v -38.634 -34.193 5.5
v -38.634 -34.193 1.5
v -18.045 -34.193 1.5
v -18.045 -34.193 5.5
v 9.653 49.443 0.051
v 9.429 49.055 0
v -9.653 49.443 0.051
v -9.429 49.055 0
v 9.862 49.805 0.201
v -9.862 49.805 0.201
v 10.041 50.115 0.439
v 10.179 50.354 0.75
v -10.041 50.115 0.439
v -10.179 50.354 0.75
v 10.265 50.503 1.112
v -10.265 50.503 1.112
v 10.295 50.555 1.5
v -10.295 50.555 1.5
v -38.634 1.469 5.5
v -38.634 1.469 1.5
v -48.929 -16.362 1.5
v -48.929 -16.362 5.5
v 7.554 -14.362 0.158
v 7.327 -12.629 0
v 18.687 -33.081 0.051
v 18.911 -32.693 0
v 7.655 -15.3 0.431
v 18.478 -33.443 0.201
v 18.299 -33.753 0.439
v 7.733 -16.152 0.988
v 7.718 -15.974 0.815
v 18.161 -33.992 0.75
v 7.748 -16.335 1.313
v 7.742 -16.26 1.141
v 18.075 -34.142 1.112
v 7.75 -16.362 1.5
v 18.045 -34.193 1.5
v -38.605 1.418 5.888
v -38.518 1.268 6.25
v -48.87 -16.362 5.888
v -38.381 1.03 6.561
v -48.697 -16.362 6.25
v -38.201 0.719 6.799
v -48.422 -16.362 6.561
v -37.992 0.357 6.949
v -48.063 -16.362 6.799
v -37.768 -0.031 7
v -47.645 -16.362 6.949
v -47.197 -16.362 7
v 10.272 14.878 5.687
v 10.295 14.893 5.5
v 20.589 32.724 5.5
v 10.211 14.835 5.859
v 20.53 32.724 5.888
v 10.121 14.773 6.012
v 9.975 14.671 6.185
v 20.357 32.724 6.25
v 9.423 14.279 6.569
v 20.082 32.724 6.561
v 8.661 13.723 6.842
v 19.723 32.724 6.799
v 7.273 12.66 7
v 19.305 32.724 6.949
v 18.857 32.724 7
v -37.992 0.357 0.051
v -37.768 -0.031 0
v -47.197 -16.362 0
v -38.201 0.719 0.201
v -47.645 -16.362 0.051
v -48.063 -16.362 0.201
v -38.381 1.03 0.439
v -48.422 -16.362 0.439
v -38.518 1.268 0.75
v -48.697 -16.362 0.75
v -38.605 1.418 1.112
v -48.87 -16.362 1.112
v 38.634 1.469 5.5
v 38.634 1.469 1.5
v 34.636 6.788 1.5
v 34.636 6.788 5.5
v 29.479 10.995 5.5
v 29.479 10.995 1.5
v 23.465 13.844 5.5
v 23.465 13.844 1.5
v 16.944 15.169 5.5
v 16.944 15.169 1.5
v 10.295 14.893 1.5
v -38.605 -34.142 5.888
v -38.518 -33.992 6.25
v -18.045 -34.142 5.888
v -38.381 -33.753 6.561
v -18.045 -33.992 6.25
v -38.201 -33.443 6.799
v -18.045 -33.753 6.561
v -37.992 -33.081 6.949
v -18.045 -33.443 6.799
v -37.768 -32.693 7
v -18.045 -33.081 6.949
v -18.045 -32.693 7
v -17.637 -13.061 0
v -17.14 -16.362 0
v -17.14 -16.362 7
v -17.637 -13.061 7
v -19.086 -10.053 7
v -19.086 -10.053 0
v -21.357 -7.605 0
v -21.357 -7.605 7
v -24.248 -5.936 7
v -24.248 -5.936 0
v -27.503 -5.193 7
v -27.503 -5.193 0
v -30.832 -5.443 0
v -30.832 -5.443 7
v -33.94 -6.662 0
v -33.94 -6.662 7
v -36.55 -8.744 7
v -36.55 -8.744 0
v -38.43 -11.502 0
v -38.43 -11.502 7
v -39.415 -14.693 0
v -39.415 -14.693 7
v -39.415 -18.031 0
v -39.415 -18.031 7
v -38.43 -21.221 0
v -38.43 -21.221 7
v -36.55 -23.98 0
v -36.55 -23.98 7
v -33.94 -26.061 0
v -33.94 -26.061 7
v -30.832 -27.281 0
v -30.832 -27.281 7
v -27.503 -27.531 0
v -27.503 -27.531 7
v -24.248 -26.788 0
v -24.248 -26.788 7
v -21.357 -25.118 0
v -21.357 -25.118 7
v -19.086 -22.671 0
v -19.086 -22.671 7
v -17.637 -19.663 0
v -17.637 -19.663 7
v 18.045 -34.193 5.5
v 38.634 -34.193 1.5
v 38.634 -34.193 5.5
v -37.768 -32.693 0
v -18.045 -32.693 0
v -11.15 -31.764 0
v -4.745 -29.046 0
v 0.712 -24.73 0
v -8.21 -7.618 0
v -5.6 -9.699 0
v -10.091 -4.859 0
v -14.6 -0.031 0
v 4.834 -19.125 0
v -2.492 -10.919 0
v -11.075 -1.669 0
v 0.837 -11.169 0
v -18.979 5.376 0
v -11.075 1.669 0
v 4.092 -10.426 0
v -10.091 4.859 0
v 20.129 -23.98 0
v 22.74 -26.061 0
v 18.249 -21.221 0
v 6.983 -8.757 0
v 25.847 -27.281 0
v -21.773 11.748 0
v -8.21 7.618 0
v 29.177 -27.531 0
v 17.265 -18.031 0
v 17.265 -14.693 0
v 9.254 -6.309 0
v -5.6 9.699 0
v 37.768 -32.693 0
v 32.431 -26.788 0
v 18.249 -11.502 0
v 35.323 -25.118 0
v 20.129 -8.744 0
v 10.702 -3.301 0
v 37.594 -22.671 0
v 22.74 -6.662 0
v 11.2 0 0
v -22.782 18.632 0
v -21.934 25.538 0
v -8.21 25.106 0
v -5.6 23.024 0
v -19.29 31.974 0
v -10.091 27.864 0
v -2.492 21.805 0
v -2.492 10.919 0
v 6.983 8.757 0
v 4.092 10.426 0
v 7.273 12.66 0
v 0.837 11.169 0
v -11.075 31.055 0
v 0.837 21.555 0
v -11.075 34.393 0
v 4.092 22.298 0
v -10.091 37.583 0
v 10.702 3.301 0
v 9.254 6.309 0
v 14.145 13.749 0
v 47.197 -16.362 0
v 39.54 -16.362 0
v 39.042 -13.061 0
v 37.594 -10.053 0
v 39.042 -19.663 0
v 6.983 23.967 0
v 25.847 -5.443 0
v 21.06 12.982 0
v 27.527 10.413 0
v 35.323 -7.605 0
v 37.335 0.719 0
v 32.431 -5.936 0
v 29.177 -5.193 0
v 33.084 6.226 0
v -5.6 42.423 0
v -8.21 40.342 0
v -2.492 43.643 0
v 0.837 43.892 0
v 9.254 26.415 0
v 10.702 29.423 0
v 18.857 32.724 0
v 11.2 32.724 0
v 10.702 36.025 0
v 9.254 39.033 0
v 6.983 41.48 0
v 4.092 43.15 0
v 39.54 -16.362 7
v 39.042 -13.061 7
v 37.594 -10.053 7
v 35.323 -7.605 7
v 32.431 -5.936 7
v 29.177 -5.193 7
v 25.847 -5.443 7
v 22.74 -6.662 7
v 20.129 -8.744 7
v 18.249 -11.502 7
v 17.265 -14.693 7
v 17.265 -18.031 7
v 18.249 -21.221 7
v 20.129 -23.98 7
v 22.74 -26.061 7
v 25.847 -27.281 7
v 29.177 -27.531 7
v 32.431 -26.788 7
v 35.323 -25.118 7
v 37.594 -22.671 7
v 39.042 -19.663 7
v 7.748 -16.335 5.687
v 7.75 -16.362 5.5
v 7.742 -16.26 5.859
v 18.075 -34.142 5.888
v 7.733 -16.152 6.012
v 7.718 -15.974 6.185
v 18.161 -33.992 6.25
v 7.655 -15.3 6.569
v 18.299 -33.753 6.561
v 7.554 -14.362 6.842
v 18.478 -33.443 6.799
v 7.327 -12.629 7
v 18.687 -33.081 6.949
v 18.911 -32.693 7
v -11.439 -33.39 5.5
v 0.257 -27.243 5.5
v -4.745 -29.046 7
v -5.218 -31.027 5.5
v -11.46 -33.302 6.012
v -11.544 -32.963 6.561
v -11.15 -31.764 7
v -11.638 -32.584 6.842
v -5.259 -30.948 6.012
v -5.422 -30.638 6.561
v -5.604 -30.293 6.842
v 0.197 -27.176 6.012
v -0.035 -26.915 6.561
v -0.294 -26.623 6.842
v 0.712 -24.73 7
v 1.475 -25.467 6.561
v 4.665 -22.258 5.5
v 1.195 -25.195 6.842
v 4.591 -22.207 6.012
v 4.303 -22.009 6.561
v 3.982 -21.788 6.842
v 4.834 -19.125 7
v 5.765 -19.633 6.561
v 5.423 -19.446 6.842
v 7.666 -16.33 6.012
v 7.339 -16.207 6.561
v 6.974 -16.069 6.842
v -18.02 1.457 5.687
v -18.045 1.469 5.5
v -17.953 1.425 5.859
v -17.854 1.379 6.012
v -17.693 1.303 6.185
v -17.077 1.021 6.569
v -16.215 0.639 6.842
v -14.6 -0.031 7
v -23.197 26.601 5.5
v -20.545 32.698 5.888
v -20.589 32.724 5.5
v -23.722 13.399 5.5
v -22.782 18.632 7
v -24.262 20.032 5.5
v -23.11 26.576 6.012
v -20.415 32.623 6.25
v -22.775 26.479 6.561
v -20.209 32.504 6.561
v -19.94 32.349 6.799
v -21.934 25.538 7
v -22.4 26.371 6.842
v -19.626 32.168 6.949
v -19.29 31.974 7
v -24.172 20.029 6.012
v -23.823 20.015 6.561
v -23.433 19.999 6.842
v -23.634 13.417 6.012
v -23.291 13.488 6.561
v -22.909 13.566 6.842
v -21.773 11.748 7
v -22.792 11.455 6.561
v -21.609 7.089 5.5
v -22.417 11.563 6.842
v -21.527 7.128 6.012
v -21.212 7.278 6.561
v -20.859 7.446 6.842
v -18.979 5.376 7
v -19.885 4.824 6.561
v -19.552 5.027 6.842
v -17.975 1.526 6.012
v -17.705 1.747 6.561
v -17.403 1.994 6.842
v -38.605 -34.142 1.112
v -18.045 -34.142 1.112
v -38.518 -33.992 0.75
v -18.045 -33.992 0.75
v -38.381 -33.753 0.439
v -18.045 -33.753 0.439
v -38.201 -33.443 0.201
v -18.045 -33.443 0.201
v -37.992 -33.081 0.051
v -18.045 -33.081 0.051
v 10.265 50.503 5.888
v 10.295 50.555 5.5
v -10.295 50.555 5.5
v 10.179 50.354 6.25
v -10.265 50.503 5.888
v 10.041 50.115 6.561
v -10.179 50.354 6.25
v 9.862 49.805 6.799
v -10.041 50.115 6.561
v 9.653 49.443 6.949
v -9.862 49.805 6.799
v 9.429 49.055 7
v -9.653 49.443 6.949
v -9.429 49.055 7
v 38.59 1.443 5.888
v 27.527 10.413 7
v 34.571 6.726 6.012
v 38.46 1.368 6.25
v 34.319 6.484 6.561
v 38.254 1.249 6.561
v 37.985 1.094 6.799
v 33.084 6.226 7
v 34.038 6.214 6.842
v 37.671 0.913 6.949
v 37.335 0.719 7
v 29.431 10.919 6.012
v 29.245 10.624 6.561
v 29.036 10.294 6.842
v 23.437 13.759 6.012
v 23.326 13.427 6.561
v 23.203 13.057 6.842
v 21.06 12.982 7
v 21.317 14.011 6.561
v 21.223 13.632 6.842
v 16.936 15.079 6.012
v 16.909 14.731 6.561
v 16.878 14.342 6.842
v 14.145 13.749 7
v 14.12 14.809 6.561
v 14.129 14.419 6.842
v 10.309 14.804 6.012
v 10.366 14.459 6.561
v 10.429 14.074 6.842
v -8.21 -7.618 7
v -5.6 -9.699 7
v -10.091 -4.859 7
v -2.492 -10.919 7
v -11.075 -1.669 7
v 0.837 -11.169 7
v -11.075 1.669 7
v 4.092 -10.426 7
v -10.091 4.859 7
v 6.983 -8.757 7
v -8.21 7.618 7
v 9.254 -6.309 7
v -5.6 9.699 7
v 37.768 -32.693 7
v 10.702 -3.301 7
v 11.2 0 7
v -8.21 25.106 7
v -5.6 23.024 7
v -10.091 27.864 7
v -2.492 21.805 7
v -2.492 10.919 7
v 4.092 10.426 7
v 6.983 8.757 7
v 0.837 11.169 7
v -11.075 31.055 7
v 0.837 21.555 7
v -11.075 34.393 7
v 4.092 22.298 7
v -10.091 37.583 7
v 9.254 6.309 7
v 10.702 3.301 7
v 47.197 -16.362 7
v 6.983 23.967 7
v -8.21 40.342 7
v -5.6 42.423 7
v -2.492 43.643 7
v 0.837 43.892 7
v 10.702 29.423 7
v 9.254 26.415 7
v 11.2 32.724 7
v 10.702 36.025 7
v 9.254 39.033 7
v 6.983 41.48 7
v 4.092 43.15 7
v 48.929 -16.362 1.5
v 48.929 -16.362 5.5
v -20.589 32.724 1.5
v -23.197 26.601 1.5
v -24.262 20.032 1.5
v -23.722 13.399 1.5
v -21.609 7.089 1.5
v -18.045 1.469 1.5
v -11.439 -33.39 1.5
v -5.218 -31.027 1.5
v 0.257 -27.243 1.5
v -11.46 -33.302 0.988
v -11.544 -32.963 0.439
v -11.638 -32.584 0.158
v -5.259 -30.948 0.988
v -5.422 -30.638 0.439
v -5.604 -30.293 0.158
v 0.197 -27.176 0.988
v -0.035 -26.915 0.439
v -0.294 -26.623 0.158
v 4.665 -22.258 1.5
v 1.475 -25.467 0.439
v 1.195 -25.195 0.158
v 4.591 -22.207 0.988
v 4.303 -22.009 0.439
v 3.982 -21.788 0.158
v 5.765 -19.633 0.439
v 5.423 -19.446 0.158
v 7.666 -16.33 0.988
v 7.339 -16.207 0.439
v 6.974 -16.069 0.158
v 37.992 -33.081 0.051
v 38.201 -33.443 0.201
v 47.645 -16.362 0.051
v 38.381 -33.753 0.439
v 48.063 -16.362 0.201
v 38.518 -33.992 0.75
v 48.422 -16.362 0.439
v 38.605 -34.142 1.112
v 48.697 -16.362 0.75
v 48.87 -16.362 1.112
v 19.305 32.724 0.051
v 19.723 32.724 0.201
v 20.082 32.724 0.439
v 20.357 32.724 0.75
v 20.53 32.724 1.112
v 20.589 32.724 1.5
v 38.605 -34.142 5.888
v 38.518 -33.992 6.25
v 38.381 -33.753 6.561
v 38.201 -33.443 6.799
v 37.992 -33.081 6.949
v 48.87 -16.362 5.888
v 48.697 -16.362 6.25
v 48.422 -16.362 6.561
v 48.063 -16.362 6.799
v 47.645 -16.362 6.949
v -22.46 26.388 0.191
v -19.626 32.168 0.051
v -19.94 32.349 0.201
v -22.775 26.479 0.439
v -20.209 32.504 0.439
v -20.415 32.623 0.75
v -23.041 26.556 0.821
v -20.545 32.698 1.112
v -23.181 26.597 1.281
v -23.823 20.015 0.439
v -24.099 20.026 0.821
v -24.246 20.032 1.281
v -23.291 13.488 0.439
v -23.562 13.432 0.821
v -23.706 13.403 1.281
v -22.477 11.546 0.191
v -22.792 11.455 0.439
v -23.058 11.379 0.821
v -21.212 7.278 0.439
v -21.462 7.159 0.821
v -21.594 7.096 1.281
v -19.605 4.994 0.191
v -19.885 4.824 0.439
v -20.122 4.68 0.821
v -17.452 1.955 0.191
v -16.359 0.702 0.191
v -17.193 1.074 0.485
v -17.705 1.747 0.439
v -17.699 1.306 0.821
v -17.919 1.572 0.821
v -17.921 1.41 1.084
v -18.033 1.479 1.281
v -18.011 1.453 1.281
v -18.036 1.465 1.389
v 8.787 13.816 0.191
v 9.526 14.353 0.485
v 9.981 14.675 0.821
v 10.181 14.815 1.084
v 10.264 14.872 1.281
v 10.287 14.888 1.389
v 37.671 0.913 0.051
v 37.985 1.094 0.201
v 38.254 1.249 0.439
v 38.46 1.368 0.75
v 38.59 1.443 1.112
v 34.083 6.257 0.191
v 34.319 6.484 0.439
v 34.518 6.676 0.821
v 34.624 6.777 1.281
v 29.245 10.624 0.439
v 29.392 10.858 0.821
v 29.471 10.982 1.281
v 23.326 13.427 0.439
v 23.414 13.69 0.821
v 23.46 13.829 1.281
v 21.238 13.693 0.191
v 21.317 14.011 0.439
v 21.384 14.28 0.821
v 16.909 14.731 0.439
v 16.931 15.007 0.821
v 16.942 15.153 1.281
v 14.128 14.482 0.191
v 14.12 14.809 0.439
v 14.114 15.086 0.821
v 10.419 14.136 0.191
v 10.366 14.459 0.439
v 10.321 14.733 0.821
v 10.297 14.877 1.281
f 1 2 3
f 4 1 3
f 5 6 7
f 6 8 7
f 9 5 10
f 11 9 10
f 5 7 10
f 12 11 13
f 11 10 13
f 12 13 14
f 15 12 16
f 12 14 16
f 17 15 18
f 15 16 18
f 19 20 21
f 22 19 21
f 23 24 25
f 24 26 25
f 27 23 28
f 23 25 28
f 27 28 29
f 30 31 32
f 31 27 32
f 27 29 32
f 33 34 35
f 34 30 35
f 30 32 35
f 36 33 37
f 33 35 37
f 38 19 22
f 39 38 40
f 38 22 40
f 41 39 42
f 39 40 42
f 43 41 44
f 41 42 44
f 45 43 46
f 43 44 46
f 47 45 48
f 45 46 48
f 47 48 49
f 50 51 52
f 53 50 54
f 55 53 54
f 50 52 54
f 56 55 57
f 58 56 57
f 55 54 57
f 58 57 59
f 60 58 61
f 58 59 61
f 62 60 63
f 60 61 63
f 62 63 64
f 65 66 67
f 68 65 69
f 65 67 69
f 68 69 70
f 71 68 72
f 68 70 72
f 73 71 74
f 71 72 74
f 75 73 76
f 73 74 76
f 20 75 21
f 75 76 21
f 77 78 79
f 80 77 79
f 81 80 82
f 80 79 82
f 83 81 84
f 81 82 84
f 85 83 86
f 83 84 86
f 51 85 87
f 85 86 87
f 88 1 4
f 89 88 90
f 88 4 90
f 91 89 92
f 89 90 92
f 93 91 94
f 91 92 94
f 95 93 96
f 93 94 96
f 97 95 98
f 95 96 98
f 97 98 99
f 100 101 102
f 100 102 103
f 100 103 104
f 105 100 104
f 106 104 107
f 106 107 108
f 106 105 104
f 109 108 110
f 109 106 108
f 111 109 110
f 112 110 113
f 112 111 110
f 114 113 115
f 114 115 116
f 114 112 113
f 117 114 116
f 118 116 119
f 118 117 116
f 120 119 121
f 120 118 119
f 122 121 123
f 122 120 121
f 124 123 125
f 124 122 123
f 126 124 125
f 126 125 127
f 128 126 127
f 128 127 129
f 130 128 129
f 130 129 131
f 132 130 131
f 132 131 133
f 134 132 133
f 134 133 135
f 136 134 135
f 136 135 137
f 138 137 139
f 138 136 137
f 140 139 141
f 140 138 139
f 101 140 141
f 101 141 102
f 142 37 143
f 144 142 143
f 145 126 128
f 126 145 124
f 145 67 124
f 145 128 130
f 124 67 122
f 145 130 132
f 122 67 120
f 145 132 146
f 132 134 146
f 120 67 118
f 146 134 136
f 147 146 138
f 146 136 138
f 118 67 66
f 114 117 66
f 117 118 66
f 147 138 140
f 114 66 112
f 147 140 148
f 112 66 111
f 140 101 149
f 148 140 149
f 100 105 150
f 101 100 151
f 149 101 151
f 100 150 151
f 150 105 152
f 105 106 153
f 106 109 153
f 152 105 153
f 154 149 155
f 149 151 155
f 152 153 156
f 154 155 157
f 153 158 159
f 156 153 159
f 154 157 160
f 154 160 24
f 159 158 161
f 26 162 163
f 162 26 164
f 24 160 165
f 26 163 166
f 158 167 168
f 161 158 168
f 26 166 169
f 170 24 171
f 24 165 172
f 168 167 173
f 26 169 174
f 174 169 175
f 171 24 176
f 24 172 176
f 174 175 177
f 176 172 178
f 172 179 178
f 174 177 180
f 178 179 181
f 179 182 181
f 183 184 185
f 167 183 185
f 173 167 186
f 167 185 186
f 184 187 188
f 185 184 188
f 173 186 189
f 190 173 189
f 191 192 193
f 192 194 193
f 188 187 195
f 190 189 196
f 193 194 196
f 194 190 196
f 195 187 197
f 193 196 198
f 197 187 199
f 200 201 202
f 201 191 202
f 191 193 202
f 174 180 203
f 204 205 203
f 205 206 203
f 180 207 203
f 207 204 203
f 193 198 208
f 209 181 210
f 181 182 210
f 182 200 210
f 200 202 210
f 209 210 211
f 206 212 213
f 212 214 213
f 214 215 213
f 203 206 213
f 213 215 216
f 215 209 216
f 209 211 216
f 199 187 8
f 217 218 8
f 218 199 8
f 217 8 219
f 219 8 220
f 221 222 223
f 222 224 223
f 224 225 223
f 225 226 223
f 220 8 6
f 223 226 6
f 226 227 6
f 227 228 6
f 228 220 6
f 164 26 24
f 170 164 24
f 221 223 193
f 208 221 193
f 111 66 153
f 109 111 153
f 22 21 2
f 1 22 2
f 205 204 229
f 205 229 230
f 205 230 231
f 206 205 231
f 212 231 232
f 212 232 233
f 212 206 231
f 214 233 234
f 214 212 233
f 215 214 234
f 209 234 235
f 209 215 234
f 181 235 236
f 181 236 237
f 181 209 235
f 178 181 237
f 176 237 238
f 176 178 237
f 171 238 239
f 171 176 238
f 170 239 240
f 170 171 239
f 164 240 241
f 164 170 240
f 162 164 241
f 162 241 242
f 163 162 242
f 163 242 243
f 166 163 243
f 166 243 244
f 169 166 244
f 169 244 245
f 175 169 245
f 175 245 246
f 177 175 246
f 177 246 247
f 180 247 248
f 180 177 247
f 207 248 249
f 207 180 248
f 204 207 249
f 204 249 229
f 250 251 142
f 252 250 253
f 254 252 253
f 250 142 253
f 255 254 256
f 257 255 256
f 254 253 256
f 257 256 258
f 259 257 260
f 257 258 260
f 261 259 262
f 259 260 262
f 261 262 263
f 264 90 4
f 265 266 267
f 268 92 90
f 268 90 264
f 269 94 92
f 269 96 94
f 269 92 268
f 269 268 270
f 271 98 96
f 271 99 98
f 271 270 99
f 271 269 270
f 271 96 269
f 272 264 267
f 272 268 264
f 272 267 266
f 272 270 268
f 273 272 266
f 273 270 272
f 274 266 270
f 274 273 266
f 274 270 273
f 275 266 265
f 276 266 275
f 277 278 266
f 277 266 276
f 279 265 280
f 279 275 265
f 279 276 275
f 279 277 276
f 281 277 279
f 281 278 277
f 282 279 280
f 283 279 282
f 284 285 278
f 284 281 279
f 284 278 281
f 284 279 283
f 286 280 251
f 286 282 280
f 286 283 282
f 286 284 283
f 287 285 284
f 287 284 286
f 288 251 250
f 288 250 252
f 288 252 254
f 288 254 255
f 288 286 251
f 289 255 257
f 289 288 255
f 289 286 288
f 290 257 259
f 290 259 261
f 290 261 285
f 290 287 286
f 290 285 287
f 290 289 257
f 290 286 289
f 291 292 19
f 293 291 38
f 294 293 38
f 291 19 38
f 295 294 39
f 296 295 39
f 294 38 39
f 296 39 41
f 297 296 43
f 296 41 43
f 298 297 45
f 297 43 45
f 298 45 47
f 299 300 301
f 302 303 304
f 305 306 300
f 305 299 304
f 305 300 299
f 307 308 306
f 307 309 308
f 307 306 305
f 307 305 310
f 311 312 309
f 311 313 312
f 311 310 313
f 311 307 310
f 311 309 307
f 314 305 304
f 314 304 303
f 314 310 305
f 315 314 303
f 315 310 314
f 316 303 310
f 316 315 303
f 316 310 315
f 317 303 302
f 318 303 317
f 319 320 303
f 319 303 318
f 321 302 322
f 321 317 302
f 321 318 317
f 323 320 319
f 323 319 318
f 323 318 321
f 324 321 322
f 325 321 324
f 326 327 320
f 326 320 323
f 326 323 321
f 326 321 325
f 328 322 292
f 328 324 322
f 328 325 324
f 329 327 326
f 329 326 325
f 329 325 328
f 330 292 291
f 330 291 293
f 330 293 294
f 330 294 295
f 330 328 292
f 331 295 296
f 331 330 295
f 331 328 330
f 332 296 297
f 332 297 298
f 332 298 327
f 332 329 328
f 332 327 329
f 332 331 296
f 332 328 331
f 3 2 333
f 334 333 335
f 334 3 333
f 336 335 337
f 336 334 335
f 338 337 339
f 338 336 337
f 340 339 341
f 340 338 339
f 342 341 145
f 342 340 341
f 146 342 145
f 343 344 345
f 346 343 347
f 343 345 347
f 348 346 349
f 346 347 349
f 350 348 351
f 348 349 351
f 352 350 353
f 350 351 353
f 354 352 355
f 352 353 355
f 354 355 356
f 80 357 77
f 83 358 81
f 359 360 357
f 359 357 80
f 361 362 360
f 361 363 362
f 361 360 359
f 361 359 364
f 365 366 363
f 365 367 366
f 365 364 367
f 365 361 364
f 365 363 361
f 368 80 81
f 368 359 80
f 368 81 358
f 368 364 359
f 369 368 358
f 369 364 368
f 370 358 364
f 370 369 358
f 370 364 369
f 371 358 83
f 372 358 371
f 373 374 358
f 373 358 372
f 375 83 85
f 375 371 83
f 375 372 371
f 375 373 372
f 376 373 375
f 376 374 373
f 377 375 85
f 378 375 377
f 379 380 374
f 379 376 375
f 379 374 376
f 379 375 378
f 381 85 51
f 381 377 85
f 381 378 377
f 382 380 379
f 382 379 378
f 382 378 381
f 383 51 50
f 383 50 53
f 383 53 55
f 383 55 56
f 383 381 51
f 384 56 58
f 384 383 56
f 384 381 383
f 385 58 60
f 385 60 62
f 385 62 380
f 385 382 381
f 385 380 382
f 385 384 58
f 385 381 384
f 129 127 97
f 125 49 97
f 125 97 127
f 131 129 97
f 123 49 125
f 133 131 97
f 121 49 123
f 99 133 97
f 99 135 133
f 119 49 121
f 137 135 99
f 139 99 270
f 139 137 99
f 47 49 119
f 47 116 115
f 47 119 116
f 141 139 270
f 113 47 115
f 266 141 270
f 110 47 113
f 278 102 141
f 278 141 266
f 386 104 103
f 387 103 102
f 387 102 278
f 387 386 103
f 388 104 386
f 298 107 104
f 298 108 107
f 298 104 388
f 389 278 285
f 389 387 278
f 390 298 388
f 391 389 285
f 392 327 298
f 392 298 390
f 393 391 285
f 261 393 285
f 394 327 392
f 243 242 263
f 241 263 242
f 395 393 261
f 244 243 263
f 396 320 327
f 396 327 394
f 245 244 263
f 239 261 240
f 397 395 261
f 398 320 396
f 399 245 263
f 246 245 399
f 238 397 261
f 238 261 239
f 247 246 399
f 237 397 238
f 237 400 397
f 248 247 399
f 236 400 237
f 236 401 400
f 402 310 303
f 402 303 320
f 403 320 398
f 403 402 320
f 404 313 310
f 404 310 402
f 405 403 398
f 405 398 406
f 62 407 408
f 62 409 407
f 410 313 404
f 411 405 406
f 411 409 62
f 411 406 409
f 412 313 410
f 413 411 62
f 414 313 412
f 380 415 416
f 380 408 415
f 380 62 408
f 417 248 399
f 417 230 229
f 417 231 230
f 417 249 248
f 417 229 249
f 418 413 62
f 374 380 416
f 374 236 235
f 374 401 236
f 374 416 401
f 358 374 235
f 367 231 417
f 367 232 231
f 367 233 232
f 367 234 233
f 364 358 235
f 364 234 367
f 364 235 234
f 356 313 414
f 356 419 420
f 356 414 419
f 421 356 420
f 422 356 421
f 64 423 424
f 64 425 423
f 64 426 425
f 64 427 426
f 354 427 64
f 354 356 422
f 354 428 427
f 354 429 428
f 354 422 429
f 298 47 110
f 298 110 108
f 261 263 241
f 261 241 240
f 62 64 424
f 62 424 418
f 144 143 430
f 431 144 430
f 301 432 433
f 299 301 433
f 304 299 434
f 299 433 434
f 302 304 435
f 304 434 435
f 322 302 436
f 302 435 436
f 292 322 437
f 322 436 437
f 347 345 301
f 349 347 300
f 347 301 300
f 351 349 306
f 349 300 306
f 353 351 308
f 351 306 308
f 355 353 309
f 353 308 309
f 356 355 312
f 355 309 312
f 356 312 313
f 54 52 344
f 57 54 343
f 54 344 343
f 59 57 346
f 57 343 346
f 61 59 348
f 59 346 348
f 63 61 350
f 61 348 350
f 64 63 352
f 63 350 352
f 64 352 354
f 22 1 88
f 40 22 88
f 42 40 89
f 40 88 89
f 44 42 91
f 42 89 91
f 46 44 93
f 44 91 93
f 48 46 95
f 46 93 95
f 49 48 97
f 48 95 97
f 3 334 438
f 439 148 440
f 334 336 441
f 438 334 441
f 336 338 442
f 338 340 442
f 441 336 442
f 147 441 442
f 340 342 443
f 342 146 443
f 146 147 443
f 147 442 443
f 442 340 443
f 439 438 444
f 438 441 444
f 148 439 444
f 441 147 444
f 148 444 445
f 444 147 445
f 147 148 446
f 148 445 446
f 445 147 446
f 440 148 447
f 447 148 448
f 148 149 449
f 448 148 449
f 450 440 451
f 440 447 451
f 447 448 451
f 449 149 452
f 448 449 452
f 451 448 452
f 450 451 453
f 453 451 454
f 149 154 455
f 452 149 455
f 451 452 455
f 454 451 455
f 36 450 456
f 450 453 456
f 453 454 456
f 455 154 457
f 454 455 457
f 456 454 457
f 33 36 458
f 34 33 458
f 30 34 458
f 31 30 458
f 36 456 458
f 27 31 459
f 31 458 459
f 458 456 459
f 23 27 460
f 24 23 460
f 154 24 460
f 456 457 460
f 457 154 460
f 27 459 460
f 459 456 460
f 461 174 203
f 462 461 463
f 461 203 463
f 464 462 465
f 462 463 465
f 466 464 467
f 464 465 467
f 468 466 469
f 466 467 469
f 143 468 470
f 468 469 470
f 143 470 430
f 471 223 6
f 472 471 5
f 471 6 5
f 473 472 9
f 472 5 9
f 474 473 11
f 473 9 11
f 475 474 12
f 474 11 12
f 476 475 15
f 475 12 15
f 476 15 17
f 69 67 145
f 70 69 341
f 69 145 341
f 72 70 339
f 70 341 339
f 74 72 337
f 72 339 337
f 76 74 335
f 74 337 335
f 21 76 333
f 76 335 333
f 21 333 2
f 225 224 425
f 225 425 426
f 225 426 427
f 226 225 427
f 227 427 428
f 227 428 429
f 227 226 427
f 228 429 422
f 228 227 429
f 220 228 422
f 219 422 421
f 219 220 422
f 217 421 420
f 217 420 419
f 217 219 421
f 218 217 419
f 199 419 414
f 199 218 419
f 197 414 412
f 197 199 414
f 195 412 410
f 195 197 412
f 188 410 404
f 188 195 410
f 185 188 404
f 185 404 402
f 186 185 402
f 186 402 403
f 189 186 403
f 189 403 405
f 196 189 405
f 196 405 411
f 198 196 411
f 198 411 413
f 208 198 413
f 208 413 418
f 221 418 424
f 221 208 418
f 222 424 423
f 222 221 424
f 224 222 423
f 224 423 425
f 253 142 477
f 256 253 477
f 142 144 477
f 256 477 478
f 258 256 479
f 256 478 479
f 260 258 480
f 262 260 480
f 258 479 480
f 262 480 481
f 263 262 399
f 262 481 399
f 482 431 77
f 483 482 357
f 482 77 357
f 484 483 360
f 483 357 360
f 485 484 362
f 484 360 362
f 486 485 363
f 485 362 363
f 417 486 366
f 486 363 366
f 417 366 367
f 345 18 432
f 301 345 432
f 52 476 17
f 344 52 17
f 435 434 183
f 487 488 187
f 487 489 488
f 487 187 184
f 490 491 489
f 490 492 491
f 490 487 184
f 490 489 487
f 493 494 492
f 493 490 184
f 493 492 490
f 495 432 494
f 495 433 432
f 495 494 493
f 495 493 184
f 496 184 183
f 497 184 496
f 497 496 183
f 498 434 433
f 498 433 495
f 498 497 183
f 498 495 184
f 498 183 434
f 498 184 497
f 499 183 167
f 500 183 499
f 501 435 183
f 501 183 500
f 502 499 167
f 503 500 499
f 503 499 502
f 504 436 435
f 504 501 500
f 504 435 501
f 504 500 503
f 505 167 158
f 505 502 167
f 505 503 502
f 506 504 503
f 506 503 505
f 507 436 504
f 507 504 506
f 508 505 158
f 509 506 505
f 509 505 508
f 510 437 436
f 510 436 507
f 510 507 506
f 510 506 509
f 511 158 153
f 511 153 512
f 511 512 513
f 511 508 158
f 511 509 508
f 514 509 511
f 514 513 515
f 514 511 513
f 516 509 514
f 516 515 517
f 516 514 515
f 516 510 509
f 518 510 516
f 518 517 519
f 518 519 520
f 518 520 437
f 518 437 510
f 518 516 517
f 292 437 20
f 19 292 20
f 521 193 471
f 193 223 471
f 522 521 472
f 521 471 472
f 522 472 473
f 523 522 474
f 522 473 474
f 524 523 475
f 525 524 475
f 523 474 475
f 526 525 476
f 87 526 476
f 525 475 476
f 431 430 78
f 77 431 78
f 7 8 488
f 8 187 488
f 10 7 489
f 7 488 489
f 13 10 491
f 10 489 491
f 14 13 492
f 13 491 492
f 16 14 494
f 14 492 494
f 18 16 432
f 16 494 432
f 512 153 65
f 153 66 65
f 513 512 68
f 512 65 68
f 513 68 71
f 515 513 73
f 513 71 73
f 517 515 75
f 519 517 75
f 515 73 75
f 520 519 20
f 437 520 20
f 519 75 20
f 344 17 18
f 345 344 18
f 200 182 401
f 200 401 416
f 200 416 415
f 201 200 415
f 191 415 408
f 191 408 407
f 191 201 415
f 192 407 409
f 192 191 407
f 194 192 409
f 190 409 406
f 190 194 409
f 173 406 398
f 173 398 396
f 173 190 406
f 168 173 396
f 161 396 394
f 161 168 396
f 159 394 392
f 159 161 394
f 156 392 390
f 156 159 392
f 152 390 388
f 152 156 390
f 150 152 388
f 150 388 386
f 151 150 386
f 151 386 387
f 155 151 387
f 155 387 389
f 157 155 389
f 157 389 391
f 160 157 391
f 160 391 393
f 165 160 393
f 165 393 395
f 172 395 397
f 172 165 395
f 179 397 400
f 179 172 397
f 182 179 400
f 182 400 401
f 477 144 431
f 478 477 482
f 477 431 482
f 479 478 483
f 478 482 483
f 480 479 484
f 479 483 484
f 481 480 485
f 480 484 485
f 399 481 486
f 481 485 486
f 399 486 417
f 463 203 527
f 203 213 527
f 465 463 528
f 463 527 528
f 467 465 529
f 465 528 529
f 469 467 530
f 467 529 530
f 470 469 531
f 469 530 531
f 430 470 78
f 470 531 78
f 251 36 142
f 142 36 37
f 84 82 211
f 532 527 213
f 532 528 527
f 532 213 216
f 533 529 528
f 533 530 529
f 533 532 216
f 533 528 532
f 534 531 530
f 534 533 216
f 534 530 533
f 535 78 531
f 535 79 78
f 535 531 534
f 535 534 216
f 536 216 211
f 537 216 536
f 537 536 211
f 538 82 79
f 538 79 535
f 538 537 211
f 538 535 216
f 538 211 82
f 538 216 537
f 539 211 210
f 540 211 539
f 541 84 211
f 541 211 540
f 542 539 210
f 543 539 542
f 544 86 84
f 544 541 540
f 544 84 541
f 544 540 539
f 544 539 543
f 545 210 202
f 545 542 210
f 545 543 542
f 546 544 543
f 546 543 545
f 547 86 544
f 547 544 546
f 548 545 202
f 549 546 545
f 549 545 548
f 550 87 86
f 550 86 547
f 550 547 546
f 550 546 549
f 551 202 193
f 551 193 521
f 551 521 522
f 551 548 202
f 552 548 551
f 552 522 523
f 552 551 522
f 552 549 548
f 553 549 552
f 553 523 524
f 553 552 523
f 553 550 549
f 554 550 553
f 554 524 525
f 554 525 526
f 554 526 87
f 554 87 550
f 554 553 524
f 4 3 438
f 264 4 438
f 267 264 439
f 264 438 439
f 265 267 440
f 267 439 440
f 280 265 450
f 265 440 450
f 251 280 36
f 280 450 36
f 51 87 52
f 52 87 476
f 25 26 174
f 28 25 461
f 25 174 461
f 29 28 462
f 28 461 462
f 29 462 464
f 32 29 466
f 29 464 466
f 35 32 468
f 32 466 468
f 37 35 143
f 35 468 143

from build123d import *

# Parameters (mm, degrees)
F0_R     = 11.2
F1_DEPTH = 7
F2_R     = 1.5
F3_R     = 1.5


with BuildPart() as f1:
    # F0 (on Top) → F1 (new body)
    with BuildSketch(Plane.XY):
        with BuildLine():
            Line((7.7504207738, -16.3618978113), (11.378000875, -10.0787447675))
            ThreePointArc((11.378000875, -10.0787447675), (13.1635861375, -7.6), (14.4174494444, -4.8142654183))
            Line((14.4174494444, -4.8142654183), (18.0450295456, 1.4688876255))
            Line((18.0450295456, 1.4688876255), (38.6342470892, 1.4688876255))
            ThreePointArc((38.6342470892, 1.4688876255), (26.5584523993, 12.6016397781), (10.2946087718, 14.8930101858))
            Line((10.2946087718, 14.8930101858), (3.0394485694, 14.8930101858))
            Line((3.0394485694, 14.8930101858), (-3.0394485694, 14.8930101858))
            Line((-3.0394485694, 14.8930101858), (-10.2946087718, 14.8930101858))
            Line((-10.2946087718, 14.8930101858), (-20.5892175436, 32.7237956226))
            ThreePointArc((-20.5892175436, 32.7237956226), (-24.1925663768, 16.6994745739), (-18.0450295456, 1.4688876255))
            Line((-18.0450295456, 1.4688876255), (-7.7504207738, -16.3618978113))
            Line((-7.7504207738, -16.3618978113), (-18.0450295456, -34.1926832481))
            ThreePointArc((-18.0450295456, -34.1926832481), (-2.3658860225, -29.301114352), (7.7504207738, -16.3618978113))
        make_face()
        Circle(F0_R, mode=Mode.SUBTRACT)
        Polygon((-38.6342470892, -34.1926832481), (-18.0450295456, -34.1926832481), (-7.7504207738, -16.3618978113), (-18.0450295456, 1.4688876255), (-38.6342470892, 1.4688876255), (-48.928855861, -16.3618978113), align=None)
        with Locations((-28.3396383174, -16.3618978113)):
            Circle(F0_R, mode=Mode.SUBTRACT)
        with BuildLine():
            ThreePointArc((14.4174494444, -4.8142654183), (13.1635861375, -7.6), (11.378000875, -10.0787447675))
            Line((11.378000875, -10.0787447675), (7.7504207738, -16.3618978113))
            Line((7.7504207738, -16.3618978113), (18.0450295456, -34.1926832481))
            Line((18.0450295456, -34.1926832481), (38.6342470892, -34.1926832481))
            Line((38.6342470892, -34.1926832481), (48.928855861, -16.3618978113))
            Line((48.928855861, -16.3618978113), (38.6342470892, 1.4688876255))
            Line((38.6342470892, 1.4688876255), (18.0450295456, 1.4688876255))
            Line((18.0450295456, 1.4688876255), (14.4174494444, -4.8142654183))
        make_face()
        with Locations((28.3396383174, -16.3618978113)):
            Circle(F0_R, mode=Mode.SUBTRACT)
        Polygon((3.0394485694, 14.8930101858), (10.2946087718, 14.8930101858), (20.5892175436, 32.7237956226), (10.2946087718, 50.5545810594), (-10.2946087718, 50.5545810594), (-20.5892175436, 32.7237956226), (-10.2946087718, 14.8930101858), (-3.0394485694, 14.8930101858), align=None)
        with Locations((0, 32.7237956226)):
            Circle(F0_R, mode=Mode.SUBTRACT)
    extrude(amount=F1_DEPTH)

    # F2
    f2_edges = [f1.edges().sort_by_distance(p)[0] for p in [
        (-24.192566, 16.699475, 7),
        (-15.441913, 41.639188, 7),
        (0, 50.554581, 7),
        (15.441913, 41.639188, 7),
        (15.441913, 23.808403, 7),
        (26.558452, 12.60164, 7),
        (43.781551, -7.446505, 7),
        (43.781551, -25.277291, 7),
        (28.339638, -34.192683, 7),
        (12.897725, -25.277291, 7),
        (-2.365886, -29.301114, 7),
        (-28.339638, -34.192683, 7),
        (-43.781551, -25.277291, 7),
        (-43.781551, -7.446505, 7),
        (-28.339638, 1.468888, 7),
    ]]
    fillet(f2_edges, radius=F2_R)

    # F3
    f3_edges = [f1.edges().sort_by_distance(p)[0] for p in [
        (-28.339638, -34.192683, 0),
        (-2.365886, -29.301114, 0),
        (12.897725, -25.277291, 0),
        (28.339638, -34.192683, 0),
        (43.781551, -25.277291, 0),
        (43.781551, -7.446505, 0),
        (26.558452, 12.60164, 0),
        (15.441913, 23.808403, 0),
        (15.441913, 41.639188, 0),
        (0, 50.554581, 0),
        (-15.441913, 41.639188, 0),
        (-24.192566, 16.699475, 0),
        (-28.339638, 1.468888, 0),
        (-43.781551, -7.446505, 0),
        (-43.781551, -25.277291, 0),
    ]]
    fillet(f3_edges, radius=F3_R)


solid = f1.part
